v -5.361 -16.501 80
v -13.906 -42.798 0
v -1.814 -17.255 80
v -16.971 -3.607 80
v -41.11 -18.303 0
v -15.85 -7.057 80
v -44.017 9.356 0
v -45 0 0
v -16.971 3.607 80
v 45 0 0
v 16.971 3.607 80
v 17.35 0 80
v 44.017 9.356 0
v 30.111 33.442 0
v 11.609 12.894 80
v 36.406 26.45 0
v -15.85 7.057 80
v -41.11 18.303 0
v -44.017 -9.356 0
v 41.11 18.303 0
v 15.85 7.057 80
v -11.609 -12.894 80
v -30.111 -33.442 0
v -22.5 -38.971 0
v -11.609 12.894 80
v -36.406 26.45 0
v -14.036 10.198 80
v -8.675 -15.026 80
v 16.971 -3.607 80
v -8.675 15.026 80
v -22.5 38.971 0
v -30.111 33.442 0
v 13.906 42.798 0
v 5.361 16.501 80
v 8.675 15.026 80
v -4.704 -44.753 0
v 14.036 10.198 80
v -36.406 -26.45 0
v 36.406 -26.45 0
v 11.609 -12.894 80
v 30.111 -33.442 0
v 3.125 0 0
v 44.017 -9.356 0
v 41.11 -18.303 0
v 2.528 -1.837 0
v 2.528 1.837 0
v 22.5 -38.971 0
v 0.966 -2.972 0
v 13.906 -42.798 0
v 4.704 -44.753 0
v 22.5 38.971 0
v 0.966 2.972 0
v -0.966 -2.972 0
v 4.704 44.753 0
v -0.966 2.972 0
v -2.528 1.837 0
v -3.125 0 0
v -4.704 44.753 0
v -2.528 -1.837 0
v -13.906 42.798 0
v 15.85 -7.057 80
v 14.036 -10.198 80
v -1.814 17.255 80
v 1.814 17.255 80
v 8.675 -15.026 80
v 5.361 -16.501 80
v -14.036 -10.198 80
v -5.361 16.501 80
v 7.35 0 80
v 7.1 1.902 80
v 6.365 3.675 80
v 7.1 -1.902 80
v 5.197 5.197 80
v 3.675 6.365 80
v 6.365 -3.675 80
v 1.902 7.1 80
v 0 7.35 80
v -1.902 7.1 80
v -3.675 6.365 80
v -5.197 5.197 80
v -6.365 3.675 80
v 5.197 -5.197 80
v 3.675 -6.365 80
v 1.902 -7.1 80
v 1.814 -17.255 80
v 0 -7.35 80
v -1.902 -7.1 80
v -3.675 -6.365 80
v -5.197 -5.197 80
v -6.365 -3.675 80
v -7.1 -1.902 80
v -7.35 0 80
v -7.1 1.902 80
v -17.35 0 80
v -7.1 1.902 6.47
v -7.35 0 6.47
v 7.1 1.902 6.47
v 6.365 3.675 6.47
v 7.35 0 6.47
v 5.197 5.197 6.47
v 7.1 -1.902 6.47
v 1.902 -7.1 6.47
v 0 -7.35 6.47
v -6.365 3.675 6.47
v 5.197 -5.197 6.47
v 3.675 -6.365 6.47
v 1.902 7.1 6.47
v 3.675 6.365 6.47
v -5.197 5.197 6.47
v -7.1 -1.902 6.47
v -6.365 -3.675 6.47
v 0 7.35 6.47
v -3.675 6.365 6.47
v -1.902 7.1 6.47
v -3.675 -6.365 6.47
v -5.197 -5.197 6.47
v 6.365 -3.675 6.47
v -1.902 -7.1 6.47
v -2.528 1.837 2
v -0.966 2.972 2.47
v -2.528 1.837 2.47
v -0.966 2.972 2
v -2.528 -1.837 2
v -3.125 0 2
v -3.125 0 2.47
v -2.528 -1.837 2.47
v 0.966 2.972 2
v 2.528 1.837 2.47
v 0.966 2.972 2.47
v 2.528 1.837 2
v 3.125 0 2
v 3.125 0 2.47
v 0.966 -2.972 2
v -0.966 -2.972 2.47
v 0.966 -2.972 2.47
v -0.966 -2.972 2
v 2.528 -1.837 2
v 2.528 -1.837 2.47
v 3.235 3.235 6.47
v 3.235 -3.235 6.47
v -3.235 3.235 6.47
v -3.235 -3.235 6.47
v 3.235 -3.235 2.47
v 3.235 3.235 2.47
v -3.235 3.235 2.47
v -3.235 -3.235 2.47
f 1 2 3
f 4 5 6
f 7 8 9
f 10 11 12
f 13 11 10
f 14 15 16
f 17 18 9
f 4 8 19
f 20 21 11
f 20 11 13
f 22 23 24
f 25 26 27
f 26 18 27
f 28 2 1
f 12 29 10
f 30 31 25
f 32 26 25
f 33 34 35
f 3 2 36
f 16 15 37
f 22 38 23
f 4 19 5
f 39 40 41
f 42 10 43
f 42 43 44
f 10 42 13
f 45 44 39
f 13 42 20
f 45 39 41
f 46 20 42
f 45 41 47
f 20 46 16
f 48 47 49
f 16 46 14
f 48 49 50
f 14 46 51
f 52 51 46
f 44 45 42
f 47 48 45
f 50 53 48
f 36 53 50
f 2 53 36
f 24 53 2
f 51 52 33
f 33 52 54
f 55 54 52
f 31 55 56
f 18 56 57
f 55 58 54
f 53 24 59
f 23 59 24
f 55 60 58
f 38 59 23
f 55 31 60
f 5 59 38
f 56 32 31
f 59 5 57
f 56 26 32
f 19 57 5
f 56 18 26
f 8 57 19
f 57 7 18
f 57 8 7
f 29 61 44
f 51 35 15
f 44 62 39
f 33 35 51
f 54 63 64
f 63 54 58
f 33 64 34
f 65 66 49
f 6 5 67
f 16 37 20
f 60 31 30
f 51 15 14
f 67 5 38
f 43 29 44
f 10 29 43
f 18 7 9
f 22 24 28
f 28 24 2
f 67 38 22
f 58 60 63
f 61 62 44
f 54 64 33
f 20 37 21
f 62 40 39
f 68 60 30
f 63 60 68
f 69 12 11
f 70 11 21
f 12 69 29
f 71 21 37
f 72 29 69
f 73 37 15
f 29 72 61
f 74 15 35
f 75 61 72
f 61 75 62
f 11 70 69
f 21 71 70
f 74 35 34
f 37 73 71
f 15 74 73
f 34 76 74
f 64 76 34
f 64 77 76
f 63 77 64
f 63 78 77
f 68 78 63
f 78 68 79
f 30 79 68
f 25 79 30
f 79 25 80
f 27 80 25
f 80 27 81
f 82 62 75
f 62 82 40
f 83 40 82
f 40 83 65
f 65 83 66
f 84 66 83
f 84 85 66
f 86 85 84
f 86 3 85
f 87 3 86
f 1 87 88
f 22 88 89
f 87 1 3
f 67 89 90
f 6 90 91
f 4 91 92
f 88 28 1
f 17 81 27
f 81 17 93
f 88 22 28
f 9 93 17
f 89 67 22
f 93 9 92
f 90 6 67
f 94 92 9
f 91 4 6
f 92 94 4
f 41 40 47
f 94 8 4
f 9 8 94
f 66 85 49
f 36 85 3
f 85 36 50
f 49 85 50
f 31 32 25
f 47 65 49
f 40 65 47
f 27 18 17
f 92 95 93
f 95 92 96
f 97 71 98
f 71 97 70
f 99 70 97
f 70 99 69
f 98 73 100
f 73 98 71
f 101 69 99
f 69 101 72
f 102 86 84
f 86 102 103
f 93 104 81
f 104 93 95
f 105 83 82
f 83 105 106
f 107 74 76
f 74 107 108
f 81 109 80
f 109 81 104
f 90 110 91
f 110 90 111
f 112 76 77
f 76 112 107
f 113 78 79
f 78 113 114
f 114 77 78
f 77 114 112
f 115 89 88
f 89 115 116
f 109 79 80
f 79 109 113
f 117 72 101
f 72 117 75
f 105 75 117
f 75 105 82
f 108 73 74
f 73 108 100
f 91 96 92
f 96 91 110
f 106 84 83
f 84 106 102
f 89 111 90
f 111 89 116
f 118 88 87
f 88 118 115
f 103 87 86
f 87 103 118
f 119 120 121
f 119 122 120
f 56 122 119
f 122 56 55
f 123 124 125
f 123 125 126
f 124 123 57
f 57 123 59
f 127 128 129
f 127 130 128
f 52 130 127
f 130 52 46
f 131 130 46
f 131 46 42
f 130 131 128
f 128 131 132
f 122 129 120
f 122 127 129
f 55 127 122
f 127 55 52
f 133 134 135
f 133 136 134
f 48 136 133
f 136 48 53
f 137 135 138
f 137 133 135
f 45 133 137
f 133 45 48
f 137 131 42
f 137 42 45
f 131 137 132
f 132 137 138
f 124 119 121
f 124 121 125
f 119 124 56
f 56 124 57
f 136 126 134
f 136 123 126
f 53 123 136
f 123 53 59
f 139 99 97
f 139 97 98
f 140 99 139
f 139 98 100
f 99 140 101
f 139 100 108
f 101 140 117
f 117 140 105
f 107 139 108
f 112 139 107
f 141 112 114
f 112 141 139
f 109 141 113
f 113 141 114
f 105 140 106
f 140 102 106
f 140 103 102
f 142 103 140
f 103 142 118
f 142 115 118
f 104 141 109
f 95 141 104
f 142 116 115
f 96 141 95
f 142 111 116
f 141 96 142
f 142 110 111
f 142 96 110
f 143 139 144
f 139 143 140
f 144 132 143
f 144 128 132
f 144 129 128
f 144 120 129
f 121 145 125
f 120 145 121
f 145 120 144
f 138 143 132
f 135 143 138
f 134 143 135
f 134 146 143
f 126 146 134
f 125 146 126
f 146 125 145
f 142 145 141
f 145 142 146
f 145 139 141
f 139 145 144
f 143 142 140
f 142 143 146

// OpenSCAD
//I need to determine the depth of the difference for the square bolt head


//cone attachment to drill as a sanding drum


//Bolt circle head 14.7 
//Square top 6.47 
//Square bottom 6.41 
//Bolt diameter 6.25

// cone

circle_radius = 14.7/2;
bolt_hole_length = 20;
cyl_base = 45;  //radius
cyl_top = (circle_radius+10);    //radius
echo("outer top radius",cyl_top);

bolt_head_span = 6.47;
cube_height = bolt_head_span ;
bolt_stem_radius =   6.25/2;
bolt_head_depth = 4; 



// formula to determine how deep bolt head should go

cyl_buffer_at_bottom = 4;

//  cube_height - cyl_buffer_at_bottom


translate([0,0,5])
    {
       // circle(r = circle_radius,center = true);
    }

difference()
    {
  cylinder(80,cyl_base,cyl_top,center = false);

            //subtracted cylinder as a hollow
    
        translate([0,0,2])
        {
           cylinder(85,circle_radius,circle_radius,center = false);
        }
        translate([0,0,0])
            {
            cylinder(h = bolt_hole_length,r1 = bolt_stem_radius,r2 = bolt_stem_radius,center = true);
        }
    }

//subtracted cylinder for bolt hole

//cube for holding bolt head

difference()
{
    translate([0,0,1/2*cube_height])
    {
   cube([cyl_base*2-10,20,cube_height],center = true); //difference_cube
        }
     translate([0,0,cube_height*.5])
        {
            translate([0,0,cube_height-bolt_head_depth])
        {    
            color("blue")
            cube([bolt_head_span ,bolt_head_span ,cube_height],center = true);
            }
        }
                    translate([0,0,0])
            {
           cylinder(h = bolt_hole_length,r1 = bolt_stem_radius,r2 = bolt_stem_radius,center = true);
        }
    
}
